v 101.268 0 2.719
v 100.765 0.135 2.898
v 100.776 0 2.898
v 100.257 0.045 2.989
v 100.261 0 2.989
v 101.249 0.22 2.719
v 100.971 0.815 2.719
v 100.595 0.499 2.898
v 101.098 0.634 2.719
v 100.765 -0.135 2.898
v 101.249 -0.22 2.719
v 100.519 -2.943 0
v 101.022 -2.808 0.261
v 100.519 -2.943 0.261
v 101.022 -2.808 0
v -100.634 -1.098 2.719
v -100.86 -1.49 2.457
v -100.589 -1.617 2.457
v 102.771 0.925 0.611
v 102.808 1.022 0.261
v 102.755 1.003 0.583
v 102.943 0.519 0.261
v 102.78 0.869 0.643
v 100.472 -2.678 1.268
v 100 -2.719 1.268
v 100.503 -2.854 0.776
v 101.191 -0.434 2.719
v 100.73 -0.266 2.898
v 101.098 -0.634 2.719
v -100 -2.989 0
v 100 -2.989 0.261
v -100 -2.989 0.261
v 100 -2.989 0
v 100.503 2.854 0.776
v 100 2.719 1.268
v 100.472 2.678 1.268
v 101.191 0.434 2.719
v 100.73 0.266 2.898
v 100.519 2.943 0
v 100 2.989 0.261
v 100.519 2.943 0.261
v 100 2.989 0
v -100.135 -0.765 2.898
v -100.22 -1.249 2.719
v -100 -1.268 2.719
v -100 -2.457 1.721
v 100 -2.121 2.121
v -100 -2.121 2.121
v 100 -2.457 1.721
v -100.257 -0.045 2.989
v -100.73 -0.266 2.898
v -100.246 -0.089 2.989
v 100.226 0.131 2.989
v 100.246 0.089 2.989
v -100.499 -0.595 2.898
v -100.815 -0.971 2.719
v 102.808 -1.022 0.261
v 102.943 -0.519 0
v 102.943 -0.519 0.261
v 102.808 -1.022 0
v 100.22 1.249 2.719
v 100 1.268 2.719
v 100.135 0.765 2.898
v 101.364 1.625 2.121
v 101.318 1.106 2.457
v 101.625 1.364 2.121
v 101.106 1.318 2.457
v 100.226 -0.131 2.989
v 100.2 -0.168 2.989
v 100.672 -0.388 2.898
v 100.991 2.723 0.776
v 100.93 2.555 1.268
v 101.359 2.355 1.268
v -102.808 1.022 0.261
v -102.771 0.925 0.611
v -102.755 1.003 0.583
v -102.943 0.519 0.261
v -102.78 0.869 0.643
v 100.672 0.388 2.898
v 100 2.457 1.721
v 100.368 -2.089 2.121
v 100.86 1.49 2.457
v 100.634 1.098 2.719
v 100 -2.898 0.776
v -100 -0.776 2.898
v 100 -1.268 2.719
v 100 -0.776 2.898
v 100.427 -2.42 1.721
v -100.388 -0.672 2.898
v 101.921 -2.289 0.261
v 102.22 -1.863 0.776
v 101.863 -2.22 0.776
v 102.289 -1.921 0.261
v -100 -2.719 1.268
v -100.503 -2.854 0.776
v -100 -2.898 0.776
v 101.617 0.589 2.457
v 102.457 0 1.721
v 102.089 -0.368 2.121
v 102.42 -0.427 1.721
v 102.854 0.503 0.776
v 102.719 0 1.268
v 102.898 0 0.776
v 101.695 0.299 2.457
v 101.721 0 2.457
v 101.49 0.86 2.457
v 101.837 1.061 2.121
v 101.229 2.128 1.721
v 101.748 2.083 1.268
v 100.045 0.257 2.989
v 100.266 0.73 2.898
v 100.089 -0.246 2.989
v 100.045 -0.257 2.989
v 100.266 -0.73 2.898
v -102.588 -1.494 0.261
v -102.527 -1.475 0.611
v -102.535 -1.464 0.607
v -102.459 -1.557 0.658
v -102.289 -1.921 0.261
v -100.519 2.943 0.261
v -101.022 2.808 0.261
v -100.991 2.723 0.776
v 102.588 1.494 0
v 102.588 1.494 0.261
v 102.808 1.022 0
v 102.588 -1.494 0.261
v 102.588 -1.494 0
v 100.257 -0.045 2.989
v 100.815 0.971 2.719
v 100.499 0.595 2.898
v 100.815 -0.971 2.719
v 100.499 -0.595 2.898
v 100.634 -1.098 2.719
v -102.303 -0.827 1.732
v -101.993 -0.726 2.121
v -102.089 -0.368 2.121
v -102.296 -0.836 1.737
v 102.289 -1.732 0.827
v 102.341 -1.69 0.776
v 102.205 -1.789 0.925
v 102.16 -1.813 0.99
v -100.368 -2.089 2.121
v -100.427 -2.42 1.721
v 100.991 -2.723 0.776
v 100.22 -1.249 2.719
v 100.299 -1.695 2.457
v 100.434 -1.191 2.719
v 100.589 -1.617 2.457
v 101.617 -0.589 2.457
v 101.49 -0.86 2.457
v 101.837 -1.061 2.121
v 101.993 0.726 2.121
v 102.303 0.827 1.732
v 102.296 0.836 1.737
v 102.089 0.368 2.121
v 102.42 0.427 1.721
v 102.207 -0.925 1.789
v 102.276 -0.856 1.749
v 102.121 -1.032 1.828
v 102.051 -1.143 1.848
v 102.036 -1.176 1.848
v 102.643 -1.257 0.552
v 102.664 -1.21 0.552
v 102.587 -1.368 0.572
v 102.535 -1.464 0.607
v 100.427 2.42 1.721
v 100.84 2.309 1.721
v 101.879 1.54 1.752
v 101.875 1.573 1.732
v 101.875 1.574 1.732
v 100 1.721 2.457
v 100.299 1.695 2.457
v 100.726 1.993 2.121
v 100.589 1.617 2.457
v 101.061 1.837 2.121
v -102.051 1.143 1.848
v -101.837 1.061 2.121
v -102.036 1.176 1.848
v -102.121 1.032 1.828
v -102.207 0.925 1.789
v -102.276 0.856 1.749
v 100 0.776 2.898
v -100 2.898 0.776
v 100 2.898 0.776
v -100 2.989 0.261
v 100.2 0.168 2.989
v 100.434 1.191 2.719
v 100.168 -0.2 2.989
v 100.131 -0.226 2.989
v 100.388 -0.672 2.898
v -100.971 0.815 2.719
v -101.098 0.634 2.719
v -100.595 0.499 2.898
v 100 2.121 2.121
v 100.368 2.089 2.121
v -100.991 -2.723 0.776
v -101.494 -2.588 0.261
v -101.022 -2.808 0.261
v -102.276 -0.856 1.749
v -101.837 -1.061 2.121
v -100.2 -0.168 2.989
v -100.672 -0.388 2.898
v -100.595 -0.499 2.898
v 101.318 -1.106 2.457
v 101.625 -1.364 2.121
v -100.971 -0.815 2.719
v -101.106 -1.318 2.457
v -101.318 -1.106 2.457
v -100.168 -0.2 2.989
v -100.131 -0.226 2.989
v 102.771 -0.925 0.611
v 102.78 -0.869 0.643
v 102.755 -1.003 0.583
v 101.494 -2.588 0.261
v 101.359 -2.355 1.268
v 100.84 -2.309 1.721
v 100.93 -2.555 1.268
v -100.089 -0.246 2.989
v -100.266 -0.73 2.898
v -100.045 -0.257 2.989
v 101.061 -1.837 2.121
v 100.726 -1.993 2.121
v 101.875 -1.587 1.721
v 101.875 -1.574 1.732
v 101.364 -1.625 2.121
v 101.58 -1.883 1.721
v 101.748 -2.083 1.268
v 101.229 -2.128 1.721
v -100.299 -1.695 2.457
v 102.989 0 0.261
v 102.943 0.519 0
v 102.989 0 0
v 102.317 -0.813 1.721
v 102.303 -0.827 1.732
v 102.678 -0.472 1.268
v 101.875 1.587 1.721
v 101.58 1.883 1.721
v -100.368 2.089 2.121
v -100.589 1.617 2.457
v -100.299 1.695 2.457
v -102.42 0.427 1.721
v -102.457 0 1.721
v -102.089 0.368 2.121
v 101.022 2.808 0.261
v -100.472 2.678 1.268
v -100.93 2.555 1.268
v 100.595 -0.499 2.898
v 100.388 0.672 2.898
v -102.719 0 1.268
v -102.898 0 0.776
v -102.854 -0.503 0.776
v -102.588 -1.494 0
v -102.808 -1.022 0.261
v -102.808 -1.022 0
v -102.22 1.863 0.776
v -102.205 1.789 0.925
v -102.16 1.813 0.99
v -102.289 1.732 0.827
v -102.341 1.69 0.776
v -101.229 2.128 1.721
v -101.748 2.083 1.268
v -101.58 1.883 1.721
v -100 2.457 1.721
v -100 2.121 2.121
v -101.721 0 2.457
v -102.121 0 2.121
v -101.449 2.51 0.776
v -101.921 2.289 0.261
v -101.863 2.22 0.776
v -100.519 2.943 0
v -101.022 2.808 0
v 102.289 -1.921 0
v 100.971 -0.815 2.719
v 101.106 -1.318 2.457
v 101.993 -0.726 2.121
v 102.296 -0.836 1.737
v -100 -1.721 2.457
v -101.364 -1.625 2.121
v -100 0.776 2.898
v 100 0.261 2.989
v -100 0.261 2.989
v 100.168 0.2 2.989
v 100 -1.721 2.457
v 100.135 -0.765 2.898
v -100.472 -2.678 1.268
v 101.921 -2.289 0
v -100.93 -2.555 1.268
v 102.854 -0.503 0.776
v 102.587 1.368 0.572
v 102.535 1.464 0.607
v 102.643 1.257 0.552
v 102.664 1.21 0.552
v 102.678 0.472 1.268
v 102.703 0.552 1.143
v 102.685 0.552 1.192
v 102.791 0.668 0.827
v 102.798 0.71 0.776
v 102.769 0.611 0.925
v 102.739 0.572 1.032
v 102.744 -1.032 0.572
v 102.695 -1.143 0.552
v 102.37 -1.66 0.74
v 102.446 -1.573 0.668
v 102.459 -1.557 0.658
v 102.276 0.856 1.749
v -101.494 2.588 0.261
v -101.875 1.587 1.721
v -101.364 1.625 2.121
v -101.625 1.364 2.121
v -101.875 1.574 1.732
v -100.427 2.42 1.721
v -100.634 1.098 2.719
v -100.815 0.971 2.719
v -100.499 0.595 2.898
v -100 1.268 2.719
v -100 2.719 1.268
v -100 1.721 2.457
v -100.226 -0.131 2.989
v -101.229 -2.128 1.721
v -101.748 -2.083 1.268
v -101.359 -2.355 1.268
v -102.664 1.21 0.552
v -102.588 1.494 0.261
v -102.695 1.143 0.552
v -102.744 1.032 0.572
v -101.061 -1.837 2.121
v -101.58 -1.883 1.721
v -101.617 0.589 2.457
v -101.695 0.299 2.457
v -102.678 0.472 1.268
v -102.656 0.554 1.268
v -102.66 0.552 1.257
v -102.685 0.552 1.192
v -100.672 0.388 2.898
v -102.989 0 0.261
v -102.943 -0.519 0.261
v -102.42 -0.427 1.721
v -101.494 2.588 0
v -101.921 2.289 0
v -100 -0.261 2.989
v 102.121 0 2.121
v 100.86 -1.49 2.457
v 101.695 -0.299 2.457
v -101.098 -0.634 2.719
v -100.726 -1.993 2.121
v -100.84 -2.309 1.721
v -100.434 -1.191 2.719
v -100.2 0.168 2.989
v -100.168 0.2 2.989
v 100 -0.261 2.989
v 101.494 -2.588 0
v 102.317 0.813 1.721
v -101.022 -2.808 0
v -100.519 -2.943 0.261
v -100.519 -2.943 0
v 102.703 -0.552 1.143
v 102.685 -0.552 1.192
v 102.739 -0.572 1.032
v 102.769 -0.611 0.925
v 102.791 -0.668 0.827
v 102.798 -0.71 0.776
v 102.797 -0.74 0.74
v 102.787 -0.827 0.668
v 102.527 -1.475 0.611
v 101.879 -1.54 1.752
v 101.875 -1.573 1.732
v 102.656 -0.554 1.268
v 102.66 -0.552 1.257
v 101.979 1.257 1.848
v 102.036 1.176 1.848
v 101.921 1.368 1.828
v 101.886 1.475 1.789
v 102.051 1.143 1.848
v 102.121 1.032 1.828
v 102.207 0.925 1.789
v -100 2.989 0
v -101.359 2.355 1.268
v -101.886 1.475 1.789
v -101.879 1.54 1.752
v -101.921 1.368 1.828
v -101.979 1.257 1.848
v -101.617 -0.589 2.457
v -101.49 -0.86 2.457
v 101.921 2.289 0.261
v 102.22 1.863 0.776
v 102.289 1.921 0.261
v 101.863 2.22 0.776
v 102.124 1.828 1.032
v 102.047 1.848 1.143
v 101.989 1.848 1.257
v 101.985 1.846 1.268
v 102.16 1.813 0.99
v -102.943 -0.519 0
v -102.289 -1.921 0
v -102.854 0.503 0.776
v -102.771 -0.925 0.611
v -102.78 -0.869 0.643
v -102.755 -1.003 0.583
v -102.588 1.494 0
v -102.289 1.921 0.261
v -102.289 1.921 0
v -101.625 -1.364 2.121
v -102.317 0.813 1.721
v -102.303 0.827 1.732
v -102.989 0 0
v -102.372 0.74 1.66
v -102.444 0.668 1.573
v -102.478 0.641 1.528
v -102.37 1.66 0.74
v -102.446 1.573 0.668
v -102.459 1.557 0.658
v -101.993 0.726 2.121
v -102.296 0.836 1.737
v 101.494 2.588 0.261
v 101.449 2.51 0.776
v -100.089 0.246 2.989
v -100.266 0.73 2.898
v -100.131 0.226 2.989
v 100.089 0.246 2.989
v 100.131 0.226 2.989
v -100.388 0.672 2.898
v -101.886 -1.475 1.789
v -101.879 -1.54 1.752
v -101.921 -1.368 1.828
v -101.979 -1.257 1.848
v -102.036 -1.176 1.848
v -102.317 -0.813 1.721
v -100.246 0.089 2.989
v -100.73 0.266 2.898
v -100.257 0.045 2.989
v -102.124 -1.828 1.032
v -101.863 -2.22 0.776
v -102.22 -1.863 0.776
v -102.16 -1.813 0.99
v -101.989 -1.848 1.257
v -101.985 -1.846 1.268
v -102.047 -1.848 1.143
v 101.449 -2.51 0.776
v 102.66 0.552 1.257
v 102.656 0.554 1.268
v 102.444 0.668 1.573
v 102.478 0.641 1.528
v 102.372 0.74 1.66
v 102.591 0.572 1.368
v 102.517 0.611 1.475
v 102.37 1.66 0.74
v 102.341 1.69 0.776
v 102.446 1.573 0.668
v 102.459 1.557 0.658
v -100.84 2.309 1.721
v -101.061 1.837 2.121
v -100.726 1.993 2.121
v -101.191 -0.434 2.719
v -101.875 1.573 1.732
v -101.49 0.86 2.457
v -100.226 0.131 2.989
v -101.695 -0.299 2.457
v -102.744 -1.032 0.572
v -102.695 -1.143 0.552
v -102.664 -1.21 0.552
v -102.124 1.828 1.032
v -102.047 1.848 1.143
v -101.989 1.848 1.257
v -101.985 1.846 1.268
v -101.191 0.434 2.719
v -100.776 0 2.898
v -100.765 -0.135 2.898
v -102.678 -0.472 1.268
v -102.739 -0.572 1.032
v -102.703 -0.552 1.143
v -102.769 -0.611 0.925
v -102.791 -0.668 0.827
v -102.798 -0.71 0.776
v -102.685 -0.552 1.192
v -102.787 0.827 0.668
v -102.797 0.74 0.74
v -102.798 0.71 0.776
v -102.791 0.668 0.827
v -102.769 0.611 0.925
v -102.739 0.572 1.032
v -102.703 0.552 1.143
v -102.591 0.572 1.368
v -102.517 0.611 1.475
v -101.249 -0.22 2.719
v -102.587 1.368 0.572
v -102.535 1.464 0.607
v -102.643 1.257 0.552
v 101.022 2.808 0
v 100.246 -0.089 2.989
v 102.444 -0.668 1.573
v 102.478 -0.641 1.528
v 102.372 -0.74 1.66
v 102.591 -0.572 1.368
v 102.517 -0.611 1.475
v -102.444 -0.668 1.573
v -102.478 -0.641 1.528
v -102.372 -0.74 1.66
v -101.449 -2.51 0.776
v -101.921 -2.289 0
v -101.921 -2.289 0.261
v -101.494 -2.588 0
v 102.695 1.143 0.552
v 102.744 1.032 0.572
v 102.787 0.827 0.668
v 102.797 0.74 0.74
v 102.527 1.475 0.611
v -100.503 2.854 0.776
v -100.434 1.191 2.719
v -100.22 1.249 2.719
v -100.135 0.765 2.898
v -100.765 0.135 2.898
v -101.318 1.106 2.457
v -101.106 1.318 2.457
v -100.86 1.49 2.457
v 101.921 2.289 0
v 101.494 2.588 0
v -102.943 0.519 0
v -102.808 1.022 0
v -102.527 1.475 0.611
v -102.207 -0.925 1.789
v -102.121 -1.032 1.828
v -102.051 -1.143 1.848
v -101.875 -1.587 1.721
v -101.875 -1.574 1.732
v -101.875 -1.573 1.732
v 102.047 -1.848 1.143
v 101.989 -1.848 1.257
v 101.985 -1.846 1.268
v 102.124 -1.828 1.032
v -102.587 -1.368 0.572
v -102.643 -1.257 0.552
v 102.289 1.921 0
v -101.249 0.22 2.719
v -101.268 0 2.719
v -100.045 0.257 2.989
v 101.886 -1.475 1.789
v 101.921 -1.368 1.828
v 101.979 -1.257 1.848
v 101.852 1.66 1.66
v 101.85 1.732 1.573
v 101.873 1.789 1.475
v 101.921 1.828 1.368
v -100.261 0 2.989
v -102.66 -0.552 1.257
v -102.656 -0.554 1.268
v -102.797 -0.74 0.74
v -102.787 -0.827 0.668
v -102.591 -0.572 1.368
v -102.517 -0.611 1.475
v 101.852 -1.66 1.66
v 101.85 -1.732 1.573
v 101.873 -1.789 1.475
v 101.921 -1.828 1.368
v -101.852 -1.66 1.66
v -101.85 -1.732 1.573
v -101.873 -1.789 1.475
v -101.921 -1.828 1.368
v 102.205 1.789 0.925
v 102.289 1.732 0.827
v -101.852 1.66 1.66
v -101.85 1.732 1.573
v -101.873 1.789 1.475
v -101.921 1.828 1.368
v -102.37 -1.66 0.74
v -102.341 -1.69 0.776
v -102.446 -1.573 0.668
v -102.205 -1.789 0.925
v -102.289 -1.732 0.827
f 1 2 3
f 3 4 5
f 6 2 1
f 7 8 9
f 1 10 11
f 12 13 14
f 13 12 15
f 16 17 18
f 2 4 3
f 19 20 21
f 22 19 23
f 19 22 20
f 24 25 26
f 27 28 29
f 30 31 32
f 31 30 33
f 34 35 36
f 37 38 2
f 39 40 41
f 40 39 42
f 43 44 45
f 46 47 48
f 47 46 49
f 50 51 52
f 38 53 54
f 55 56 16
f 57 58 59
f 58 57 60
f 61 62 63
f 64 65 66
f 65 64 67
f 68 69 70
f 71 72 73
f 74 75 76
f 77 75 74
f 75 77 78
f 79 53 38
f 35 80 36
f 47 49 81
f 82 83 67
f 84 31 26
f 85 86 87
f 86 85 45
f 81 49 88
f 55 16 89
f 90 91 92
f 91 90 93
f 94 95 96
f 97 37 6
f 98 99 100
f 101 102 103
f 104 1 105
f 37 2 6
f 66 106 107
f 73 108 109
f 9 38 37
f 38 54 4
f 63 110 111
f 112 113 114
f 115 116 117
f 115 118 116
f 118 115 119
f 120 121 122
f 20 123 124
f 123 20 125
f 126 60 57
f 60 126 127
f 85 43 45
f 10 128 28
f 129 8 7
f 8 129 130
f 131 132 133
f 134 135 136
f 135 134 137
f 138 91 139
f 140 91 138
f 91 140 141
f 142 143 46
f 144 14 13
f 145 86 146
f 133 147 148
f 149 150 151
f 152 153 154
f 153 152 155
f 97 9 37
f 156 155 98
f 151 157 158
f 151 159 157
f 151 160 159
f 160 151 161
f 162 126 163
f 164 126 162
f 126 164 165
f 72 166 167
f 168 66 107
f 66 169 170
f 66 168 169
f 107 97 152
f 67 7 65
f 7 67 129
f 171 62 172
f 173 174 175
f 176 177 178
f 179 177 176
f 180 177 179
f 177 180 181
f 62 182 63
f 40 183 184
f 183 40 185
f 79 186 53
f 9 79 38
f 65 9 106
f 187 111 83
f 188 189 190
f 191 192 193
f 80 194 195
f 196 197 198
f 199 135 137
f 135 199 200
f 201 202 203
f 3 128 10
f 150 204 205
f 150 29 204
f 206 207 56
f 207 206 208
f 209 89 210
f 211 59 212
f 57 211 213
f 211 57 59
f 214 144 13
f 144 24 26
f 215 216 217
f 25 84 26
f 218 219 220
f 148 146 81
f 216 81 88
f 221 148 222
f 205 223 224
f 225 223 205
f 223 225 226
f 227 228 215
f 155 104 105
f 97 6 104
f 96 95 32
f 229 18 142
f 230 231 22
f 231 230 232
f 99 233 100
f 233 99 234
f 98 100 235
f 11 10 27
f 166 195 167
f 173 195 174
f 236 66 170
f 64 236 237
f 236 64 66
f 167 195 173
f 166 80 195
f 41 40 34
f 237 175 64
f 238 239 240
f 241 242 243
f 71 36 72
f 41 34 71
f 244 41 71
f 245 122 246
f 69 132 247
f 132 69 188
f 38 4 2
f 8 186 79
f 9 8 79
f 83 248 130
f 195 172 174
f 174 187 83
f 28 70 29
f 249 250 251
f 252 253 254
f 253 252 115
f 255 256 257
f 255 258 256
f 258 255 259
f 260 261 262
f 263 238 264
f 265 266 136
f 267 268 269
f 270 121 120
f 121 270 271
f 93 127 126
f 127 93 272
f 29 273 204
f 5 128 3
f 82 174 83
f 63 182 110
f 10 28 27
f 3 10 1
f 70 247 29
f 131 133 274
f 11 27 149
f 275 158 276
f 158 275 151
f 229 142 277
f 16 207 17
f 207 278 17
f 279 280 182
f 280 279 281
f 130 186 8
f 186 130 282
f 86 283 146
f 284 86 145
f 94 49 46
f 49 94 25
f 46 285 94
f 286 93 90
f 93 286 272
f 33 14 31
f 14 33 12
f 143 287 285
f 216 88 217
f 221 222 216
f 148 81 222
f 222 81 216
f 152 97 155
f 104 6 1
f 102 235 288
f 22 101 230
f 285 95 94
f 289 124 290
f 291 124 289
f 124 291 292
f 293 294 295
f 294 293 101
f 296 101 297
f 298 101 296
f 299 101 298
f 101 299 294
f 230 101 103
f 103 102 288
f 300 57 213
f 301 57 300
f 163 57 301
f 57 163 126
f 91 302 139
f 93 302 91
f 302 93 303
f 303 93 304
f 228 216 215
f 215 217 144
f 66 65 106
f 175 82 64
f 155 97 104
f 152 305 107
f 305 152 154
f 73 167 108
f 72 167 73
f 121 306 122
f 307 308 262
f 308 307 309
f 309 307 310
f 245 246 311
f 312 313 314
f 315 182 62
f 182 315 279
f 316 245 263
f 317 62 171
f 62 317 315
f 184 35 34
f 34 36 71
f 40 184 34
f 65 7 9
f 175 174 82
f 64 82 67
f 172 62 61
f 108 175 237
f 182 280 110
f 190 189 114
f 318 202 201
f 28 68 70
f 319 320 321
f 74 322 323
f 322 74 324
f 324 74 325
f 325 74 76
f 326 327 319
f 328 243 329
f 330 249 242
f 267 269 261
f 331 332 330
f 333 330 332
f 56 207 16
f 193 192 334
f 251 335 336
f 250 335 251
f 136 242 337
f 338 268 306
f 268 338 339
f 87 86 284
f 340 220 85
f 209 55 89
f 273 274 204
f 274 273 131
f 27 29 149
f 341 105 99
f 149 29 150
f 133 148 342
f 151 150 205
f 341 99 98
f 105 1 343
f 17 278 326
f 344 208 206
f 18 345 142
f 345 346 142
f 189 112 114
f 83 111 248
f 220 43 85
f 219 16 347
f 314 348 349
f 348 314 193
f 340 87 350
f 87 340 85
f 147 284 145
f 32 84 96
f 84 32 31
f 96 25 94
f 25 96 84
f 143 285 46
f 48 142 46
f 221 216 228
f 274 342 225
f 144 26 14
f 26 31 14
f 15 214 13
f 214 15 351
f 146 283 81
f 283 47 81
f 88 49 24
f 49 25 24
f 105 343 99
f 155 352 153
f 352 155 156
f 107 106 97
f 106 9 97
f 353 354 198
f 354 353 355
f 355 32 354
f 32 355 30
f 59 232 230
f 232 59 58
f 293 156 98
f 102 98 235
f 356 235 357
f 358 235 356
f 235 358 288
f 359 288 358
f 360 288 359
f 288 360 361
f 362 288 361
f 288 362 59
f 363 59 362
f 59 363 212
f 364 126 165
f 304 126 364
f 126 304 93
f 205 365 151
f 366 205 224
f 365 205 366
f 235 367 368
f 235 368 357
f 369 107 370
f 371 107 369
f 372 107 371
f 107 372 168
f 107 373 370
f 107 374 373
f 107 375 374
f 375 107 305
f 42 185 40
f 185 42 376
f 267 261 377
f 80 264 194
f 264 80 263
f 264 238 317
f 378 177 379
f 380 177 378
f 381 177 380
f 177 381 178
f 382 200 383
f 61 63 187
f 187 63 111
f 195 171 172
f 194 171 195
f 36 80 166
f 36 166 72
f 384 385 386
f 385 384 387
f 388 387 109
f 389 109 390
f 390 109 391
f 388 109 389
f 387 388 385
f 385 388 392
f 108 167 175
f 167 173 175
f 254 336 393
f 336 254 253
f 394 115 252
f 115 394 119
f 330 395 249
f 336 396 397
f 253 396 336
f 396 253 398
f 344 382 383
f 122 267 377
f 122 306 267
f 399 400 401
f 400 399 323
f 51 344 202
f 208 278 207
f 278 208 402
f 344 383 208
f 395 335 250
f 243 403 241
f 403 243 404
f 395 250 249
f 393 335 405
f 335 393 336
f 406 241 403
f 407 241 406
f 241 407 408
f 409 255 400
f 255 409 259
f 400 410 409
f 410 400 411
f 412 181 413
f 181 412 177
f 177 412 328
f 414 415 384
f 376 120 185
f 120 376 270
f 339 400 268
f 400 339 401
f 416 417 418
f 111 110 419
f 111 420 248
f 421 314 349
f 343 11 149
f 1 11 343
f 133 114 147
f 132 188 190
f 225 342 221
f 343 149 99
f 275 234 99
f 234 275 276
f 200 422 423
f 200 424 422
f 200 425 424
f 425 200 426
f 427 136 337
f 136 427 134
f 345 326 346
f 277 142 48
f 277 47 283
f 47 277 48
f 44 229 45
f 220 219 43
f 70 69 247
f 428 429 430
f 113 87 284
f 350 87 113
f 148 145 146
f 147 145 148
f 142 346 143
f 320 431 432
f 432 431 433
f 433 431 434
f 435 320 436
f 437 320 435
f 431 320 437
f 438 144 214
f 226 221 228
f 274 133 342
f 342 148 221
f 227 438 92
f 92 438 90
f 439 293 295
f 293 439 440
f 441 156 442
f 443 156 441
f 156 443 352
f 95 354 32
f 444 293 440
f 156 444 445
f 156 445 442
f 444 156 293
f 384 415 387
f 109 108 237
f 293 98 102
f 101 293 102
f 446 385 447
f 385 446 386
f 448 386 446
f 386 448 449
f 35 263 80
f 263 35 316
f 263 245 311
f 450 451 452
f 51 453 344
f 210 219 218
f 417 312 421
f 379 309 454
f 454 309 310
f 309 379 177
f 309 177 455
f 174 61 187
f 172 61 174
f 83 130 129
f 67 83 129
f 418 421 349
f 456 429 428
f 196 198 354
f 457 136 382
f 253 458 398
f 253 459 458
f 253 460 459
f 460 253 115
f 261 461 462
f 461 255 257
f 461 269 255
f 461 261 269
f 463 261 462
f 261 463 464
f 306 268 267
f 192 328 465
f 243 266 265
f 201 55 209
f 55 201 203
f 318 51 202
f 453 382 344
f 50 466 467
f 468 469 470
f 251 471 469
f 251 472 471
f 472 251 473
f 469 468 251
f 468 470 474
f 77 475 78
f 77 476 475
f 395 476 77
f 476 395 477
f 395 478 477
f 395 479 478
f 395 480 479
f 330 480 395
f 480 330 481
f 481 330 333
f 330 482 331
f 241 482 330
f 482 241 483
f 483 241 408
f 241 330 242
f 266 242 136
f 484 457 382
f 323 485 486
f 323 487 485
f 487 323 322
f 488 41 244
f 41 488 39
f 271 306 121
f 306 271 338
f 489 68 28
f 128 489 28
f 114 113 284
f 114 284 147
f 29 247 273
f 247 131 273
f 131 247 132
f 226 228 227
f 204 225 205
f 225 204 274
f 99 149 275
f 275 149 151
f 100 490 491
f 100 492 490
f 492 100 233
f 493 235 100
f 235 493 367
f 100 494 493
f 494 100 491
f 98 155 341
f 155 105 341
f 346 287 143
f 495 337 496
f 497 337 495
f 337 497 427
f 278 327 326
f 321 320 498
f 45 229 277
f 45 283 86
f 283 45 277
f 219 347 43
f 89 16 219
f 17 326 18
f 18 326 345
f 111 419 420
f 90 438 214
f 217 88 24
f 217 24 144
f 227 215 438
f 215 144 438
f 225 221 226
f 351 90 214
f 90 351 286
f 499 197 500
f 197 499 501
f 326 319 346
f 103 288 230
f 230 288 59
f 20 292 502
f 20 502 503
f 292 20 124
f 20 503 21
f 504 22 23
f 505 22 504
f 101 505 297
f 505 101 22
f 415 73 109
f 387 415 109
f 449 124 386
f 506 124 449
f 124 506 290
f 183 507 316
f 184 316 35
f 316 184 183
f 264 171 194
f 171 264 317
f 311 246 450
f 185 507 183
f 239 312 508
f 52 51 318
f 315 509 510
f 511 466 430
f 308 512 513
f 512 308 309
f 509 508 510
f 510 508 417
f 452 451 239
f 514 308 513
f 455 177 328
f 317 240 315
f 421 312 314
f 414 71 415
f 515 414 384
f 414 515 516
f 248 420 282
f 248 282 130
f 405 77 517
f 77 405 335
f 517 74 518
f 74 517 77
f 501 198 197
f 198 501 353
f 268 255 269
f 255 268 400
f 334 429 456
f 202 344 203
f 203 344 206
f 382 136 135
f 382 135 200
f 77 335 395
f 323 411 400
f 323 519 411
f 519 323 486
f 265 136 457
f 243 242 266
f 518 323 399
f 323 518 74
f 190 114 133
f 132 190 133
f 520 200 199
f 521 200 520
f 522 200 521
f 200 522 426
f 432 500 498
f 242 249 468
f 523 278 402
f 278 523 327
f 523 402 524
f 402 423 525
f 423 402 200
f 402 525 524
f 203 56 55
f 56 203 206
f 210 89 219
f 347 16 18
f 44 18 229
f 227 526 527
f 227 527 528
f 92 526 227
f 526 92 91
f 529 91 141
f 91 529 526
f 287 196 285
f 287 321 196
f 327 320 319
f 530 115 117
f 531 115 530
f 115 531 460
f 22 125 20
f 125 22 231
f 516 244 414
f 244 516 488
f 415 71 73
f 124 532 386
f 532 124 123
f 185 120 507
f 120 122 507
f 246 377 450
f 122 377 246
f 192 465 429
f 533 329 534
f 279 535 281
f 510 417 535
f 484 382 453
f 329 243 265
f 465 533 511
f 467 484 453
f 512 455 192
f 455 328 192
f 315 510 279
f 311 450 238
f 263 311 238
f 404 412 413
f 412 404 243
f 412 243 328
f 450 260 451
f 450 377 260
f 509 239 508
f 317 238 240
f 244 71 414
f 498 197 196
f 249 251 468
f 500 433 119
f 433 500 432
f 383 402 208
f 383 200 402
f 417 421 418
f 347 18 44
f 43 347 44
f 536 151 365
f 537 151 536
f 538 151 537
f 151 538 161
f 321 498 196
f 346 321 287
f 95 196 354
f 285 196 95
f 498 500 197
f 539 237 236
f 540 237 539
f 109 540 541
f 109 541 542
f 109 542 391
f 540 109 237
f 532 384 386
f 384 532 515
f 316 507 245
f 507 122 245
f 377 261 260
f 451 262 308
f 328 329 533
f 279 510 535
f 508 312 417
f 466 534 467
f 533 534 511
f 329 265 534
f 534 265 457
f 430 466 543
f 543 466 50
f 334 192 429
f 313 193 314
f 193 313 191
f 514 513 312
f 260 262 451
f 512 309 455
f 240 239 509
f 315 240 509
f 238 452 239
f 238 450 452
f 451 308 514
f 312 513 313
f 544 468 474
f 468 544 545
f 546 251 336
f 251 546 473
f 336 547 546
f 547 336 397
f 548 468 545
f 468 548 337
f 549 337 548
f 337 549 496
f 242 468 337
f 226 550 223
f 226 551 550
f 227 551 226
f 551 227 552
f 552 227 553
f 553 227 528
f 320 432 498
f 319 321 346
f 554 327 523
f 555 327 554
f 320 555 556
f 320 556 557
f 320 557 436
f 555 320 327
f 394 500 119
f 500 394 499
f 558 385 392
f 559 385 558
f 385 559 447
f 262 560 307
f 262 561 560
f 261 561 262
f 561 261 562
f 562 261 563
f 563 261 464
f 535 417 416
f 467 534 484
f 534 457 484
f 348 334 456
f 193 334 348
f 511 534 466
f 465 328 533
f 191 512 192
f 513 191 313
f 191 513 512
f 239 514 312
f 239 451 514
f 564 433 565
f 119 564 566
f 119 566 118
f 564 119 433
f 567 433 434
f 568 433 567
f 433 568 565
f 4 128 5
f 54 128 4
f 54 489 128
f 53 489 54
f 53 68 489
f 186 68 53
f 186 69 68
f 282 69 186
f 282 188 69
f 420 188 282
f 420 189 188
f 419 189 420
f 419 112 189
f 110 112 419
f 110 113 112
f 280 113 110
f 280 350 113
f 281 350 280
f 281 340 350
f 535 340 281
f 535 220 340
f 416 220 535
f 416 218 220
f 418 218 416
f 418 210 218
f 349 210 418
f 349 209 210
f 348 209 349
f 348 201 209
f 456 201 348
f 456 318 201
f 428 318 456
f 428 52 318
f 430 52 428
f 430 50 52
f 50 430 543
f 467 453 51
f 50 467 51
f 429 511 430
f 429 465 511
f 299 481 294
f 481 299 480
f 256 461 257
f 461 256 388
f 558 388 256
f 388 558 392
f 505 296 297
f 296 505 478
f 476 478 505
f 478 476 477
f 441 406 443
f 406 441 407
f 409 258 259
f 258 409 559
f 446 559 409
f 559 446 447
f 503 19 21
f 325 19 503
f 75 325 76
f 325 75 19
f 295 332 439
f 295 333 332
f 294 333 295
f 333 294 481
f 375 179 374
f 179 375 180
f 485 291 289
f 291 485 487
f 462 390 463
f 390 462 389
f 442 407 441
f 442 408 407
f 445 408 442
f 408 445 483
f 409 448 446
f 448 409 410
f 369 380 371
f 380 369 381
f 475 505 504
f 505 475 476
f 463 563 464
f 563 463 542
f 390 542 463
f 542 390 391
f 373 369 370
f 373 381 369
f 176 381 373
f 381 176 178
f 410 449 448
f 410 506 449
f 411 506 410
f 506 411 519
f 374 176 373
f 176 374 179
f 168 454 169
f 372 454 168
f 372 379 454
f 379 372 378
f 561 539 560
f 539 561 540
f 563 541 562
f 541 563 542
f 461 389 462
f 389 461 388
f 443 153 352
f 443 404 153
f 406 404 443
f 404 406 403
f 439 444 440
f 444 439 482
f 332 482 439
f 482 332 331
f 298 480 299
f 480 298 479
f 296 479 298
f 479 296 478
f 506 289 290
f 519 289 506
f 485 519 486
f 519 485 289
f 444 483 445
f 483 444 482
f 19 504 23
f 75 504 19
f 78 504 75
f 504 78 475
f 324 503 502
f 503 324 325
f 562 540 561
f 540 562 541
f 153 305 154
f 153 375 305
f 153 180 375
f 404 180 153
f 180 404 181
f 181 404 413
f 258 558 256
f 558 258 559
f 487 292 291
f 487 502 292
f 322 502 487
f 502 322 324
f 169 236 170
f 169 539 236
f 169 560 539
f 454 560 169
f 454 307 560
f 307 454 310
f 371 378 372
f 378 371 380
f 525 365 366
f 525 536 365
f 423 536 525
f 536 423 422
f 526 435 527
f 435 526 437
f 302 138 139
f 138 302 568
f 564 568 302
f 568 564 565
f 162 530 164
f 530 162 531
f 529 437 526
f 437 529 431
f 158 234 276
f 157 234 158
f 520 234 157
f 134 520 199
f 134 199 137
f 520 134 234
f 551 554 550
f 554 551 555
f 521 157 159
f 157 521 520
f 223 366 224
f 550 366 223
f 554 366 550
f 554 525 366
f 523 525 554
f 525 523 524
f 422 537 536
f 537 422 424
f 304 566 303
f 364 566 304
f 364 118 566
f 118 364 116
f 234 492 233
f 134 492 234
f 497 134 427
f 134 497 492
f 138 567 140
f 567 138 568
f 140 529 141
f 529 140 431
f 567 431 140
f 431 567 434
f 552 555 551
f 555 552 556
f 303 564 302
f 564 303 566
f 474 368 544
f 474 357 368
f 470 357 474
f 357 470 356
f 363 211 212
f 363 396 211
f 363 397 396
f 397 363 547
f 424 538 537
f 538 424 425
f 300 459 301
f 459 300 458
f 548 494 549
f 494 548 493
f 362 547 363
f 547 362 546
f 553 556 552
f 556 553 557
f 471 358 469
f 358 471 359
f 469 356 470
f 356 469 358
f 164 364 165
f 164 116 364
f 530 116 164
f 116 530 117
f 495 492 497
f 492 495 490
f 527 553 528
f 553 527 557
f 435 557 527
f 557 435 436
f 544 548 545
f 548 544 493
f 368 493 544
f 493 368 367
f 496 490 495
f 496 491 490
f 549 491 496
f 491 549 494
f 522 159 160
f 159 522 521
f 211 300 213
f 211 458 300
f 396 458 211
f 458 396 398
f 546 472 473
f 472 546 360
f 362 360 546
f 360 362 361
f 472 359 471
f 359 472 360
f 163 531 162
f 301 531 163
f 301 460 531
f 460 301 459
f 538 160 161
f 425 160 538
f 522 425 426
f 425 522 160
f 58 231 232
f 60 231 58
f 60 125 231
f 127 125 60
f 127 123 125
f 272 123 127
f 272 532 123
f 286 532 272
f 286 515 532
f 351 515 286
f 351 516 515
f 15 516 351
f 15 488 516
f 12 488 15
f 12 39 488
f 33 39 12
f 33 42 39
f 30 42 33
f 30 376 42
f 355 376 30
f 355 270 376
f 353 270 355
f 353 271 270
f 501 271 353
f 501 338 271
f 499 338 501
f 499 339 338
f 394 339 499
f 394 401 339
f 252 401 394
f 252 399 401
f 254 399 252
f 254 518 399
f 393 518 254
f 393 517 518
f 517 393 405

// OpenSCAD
$fn=36;
length=200;
width=6;
wire_radius=0.65;


difference()
    {
    union()
        {
        hull()
            {
            translate([-length/2,0,0])
                sphere(r=width/2);

            translate([length/2,0,0])
                sphere(r=width/2);
            
            }



        }
        translate([0,width/5,width/5])
        hull()
            {
            translate([-length,0,0])
                sphere(r=wire_radius);

            translate([length,0,0])
                sphere(r=wire_radius);
            
            }

        translate([0,-width/5,width/5])
        hull()
            {
            translate([-length,0,0])
                sphere(r=wire_radius);

            translate([length,0,0])
                sphere(r=wire_radius);
            
            }

        translate([-length,-width,-width*2])
            cube([length*2,width*2,width*2]);

    }
